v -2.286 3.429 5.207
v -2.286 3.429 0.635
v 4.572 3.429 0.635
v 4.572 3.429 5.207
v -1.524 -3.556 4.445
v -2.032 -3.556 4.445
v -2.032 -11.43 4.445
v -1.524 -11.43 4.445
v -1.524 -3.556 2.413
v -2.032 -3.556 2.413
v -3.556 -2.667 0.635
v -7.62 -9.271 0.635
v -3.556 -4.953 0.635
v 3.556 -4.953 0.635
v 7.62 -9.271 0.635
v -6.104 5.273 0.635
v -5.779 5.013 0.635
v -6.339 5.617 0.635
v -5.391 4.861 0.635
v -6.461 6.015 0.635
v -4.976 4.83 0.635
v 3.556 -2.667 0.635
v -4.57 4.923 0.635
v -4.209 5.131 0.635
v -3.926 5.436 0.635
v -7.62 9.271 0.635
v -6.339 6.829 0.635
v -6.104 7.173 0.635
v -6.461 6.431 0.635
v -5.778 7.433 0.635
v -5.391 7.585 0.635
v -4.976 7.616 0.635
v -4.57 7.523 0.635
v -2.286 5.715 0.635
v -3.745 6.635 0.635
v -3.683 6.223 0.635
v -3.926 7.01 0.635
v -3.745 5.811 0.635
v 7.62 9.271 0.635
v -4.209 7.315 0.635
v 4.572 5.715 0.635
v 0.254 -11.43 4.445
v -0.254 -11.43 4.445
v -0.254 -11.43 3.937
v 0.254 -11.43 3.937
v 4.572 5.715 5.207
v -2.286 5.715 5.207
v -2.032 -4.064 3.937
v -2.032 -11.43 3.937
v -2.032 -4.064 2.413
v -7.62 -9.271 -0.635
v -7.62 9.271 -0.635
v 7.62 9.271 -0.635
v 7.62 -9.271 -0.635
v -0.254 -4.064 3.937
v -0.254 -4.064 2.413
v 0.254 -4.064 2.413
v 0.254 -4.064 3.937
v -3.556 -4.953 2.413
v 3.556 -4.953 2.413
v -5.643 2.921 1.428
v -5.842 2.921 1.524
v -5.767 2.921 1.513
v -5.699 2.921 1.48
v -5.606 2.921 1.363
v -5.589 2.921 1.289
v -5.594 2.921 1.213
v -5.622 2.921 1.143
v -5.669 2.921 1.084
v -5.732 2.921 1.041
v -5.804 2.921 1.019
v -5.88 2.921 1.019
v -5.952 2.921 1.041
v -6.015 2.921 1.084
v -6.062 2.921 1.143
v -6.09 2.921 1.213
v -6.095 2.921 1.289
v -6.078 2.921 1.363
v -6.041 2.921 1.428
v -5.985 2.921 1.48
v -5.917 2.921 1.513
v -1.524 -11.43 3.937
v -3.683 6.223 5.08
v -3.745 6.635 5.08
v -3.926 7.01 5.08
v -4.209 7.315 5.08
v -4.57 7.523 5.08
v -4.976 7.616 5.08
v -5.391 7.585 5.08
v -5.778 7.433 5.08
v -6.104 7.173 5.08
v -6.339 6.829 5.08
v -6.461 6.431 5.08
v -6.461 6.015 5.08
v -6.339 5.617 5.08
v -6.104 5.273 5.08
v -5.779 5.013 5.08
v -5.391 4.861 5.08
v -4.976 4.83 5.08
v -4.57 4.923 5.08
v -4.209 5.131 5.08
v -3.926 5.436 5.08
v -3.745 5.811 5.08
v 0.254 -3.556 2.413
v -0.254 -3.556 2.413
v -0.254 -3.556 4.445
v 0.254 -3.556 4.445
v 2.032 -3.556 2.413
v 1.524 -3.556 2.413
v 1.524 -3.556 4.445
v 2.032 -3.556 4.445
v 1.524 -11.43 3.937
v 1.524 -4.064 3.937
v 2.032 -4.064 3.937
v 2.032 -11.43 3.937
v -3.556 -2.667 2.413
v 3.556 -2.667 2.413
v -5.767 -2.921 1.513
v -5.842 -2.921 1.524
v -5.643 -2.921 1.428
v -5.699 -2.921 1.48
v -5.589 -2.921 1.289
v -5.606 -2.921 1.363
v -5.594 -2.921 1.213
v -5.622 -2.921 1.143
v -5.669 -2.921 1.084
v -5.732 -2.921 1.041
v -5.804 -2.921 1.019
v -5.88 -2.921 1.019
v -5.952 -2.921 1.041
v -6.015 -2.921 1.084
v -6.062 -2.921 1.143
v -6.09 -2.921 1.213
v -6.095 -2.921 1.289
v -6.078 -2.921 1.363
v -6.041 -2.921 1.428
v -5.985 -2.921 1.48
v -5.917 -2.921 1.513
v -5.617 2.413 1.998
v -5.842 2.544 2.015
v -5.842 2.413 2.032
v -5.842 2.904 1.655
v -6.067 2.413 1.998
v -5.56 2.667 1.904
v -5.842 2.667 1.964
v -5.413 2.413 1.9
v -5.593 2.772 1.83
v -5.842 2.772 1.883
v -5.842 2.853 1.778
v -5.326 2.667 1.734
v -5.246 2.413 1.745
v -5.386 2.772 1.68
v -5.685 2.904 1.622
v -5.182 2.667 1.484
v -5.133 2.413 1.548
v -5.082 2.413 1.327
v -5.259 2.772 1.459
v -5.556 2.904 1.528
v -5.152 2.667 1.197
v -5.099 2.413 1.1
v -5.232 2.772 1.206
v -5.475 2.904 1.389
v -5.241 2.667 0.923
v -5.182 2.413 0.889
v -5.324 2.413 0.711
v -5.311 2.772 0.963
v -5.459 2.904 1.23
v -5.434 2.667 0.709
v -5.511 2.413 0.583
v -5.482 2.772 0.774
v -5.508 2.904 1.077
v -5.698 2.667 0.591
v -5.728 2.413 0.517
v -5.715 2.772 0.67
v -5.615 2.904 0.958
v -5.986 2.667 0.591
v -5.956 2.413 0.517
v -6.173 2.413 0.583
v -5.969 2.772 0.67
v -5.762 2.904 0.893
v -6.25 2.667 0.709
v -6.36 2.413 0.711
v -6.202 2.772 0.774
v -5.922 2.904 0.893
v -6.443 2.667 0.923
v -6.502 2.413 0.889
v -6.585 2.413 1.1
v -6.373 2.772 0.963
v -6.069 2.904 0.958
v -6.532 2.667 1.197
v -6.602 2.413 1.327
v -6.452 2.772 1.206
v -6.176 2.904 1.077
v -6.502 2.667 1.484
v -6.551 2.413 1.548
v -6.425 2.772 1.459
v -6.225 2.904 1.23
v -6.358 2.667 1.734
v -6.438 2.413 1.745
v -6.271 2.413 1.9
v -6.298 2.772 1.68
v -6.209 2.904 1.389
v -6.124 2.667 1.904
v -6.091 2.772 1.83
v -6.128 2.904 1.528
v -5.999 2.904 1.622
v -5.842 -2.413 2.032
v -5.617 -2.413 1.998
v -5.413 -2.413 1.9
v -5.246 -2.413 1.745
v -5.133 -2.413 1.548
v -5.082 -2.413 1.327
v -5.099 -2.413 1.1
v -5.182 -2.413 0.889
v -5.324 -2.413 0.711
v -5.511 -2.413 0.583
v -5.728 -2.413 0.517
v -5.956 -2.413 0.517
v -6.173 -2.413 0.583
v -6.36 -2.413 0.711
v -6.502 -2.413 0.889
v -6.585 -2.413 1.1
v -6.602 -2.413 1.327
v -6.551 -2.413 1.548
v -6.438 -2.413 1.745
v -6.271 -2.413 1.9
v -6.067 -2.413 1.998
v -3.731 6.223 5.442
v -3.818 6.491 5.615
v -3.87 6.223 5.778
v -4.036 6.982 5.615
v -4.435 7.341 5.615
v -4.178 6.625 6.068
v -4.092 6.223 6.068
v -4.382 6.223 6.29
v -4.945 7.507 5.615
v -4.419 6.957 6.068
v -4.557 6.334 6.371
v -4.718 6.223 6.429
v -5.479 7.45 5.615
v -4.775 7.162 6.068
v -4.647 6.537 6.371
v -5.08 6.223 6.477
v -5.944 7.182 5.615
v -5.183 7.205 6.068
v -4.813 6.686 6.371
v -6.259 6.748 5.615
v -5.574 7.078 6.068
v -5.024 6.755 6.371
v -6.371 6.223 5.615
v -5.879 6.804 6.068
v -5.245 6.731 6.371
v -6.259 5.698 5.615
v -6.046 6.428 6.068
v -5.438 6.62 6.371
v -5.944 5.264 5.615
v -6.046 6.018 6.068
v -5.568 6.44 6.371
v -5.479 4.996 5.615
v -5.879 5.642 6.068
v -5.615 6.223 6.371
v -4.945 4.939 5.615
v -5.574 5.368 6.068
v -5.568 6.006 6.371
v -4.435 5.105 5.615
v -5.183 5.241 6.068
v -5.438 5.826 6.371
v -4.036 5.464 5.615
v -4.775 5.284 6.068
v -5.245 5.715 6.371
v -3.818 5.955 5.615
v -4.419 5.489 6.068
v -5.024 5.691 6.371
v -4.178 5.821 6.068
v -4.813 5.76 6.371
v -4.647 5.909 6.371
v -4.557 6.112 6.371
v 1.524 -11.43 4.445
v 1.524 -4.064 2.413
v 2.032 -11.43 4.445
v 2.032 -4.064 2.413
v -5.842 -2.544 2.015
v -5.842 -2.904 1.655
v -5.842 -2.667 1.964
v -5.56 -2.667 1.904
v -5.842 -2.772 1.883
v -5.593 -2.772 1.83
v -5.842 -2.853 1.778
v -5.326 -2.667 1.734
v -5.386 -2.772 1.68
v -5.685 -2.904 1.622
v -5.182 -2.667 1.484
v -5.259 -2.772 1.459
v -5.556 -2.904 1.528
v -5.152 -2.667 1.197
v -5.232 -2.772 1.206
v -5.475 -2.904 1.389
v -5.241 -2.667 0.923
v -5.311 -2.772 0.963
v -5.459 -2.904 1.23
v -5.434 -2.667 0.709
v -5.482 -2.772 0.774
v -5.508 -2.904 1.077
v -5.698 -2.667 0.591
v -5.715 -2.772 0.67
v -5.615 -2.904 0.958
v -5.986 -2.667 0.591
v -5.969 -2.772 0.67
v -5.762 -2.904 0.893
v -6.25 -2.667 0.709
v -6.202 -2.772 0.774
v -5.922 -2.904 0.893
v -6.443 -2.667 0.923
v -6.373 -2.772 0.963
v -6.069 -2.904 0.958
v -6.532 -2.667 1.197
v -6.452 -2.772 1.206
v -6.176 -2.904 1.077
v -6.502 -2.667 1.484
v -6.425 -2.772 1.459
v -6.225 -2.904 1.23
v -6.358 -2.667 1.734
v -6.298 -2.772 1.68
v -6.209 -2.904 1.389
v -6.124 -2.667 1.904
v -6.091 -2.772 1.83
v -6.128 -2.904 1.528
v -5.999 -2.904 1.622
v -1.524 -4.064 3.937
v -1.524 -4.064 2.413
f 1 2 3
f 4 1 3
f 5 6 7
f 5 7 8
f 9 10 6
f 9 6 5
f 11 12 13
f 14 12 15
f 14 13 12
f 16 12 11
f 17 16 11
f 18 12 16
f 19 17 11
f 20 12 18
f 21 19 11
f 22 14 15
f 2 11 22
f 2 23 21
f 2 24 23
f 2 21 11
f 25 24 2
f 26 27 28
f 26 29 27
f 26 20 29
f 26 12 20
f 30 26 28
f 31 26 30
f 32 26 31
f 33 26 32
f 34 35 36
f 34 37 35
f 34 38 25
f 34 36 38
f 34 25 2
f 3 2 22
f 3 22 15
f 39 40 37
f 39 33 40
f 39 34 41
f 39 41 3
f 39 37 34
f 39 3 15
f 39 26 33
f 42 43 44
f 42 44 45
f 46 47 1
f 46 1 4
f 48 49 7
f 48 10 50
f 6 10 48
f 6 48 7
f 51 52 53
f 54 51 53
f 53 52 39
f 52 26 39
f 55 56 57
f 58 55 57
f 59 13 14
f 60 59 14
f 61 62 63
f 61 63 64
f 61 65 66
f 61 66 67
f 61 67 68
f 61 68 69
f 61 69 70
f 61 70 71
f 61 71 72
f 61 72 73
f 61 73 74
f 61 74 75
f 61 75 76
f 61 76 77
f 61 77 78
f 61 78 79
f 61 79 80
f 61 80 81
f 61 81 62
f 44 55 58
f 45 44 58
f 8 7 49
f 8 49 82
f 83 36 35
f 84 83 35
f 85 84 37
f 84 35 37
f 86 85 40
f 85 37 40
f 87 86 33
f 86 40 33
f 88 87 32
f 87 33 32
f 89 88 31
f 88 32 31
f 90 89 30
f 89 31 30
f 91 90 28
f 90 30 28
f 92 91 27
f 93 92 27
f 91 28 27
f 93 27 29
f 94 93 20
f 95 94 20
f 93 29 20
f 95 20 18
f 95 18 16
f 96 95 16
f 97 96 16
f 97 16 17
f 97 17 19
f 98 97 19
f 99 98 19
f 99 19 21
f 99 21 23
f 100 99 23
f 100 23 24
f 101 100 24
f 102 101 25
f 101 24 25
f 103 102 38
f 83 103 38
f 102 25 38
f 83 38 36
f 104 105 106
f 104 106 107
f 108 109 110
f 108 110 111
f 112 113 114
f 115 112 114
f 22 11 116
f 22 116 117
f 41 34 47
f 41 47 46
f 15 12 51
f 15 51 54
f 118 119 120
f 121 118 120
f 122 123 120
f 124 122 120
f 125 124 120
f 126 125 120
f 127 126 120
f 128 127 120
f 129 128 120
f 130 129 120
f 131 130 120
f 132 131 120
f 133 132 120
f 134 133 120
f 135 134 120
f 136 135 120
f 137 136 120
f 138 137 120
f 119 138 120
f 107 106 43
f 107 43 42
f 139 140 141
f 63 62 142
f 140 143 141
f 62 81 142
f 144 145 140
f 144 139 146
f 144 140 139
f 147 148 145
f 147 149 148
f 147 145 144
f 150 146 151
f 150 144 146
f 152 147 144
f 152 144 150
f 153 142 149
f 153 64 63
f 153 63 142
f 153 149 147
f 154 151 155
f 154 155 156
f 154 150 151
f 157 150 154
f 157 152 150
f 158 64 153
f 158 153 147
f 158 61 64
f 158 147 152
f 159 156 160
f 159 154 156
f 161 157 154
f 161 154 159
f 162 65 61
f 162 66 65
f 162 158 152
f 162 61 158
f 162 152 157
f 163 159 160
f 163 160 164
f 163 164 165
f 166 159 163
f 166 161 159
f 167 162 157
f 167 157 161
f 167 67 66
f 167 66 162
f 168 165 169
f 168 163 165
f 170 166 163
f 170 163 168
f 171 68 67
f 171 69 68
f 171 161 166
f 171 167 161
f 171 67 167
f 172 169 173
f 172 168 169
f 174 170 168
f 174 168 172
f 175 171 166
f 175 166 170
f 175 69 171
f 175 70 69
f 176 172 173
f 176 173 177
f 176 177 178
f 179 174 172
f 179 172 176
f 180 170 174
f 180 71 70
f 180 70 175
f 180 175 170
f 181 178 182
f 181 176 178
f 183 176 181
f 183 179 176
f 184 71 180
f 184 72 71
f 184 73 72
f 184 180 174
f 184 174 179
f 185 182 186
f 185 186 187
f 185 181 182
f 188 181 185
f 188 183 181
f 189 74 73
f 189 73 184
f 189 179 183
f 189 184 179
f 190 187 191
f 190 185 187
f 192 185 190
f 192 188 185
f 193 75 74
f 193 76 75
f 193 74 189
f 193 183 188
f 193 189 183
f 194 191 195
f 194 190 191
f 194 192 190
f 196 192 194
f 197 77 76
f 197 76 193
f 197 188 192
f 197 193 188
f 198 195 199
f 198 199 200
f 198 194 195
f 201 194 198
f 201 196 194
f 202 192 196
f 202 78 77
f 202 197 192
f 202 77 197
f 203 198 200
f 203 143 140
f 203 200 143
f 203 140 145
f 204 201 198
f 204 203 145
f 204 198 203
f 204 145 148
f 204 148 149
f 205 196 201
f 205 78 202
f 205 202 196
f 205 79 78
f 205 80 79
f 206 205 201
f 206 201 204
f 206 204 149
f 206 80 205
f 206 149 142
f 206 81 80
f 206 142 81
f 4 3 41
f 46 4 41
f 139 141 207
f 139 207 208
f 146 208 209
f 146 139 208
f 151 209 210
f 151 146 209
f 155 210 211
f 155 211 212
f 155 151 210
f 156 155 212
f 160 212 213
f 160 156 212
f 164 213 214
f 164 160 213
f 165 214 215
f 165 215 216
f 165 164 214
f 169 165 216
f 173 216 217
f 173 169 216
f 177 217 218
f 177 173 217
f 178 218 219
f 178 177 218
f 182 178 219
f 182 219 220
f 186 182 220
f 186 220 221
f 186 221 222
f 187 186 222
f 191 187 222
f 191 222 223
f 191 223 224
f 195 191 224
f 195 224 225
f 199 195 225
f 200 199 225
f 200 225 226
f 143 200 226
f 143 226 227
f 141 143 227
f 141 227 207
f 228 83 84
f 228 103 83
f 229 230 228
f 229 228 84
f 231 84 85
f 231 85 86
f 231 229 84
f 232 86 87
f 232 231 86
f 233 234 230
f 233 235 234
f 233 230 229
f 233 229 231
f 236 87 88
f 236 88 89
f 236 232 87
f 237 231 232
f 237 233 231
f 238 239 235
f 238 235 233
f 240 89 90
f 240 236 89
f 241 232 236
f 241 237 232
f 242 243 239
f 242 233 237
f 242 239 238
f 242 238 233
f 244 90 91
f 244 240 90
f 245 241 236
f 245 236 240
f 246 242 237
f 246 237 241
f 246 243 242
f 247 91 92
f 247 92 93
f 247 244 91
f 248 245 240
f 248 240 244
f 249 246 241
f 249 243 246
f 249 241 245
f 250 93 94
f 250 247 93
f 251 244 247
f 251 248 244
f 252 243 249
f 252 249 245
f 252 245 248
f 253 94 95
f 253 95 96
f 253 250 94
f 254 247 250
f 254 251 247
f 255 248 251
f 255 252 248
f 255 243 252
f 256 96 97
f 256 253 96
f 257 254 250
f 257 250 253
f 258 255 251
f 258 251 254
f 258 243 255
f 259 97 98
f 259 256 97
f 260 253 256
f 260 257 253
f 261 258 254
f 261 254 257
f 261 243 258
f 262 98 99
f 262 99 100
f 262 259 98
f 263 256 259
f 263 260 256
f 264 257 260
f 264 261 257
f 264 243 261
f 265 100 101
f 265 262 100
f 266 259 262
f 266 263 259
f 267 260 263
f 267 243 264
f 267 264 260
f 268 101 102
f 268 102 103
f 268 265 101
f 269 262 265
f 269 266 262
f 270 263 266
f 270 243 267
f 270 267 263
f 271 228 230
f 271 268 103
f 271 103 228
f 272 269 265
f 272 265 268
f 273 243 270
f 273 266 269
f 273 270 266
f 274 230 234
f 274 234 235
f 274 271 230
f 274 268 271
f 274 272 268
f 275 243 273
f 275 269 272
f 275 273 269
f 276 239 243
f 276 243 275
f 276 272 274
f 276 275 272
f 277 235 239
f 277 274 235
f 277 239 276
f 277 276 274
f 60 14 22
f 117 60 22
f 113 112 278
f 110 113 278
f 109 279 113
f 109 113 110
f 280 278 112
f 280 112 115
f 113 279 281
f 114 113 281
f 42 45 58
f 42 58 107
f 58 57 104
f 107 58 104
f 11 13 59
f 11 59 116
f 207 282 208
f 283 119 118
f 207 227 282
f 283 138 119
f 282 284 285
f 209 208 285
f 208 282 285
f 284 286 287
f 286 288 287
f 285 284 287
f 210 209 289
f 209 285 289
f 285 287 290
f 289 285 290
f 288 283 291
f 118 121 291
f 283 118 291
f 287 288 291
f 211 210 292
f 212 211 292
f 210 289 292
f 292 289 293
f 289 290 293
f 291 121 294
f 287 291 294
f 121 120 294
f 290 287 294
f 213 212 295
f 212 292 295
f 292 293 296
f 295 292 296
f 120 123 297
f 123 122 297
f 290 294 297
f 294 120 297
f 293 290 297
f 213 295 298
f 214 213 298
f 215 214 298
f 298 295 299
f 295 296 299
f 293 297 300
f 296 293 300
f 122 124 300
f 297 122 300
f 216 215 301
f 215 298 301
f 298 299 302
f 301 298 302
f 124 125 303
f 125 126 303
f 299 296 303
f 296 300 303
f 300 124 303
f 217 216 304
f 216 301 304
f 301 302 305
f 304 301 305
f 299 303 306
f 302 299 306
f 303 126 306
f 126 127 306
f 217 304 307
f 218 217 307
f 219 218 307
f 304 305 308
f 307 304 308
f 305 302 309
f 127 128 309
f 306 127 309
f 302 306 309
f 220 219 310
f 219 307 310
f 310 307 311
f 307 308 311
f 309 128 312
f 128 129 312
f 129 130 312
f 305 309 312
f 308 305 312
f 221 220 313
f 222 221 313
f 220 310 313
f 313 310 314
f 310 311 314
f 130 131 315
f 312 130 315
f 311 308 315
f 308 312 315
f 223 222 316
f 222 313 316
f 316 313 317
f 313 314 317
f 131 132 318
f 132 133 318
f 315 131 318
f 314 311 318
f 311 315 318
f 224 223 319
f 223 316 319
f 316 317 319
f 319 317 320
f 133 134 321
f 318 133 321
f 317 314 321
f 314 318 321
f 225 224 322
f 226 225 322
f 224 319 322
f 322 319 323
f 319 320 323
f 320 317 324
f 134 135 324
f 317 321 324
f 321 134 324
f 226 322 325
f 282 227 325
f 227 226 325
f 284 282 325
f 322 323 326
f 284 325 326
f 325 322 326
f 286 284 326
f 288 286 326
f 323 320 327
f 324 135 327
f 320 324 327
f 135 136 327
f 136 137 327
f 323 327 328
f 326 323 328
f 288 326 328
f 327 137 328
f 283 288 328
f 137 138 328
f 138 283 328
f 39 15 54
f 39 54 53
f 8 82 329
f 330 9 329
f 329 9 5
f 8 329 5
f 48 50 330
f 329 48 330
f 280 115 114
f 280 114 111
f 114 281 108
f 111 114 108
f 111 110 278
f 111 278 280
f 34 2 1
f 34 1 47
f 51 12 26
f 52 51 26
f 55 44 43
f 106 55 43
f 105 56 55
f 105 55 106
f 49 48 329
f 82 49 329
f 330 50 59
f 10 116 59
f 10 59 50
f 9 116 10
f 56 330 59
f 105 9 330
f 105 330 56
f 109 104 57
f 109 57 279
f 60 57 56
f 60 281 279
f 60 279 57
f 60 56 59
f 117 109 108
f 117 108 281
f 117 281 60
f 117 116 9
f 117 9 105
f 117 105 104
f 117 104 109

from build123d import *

# Parameters (mm, degrees)
SKETCH1_W           = 15.24
SKETCH1_H           = 18.542
BOSS_EXTRUDE1_DEPTH = 0.635
SKETCH2_W           = 7.112
SKETCH2_H           = 2.286
BOSS_EXTRUDE2_DEPTH = 1.778
SKETCH3_W           = 0.508
SKETCH3_H           = 0.508
BOSS_EXTRUDE3_DEPTH = 2.032
SKETCH4_W           = 0.508
SKETCH4_H           = 0.508
BOSS_EXTRUDE4_DEPTH = 7.366
SKETCH8_W           = 6.858
SKETCH8_H           = 2.286
BOSS_EXTRUDE6_DEPTH = 4.572
SKETCH9_R           = 1.397
BOSS_EXTRUDE7_DEPTH = 5.842
FILLET1_R           = 1.397
SKETCH10_R          = 0.762
BOSS_EXTRUDE8_DEPTH = 2.921
FILLET2_R           = 0.508


with BuildPart() as part:
    # Sketch1 → Boss-Extrude1 (new, symmetric)
    with BuildSketch(Plane.XY):
        Rectangle(SKETCH1_W, SKETCH1_H)
    extrude(amount=BOSS_EXTRUDE1_DEPTH, both=True)

    # Sketch2 → Boss-Extrude2 (add)
    with BuildSketch(Plane.XY.offset(0.635)):
        with Locations((0, -3.81)):
            Rectangle(SKETCH2_W, SKETCH2_H)
    extrude(amount=BOSS_EXTRUDE2_DEPTH)

    # Sketch3 → Boss-Extrude3 (add)
    with BuildSketch(Plane.XY.offset(2.413)):
        with Locations((-1.778, -3.81)):
            Rectangle(SKETCH3_W, SKETCH3_H)
        with Locations((0, -3.81)):
            Rectangle(SKETCH3_W, SKETCH3_H)
        with Locations((1.778, -3.81)):
            Rectangle(SKETCH3_W, SKETCH3_H)
    extrude(amount=BOSS_EXTRUDE3_DEPTH)

    # Sketch4 → Boss-Extrude4 (add)
    with BuildSketch(Plane.XZ.offset(4.064)):
        with Locations((-1.778, 4.191)):
            Rectangle(SKETCH4_W, SKETCH4_H)
        with Locations((0, 4.191)):
            Rectangle(SKETCH4_W, SKETCH4_H)
        with Locations((1.778, 4.191)):
            Rectangle(SKETCH4_W, SKETCH4_H)
    extrude(amount=BOSS_EXTRUDE4_DEPTH)

    # Sketch8 → Boss-Extrude6 (add)
    with BuildSketch(Plane.XY.offset(0.635)):
        with Locations((1.143, 4.572)):
            Rectangle(SKETCH8_W, SKETCH8_H)
    extrude(amount=BOSS_EXTRUDE6_DEPTH)

    # Sketch9 → Boss-Extrude7 (add)
    with BuildSketch(Plane.XY.offset(0.635)):
        with Locations((-5.08, 6.223)):
            Circle(SKETCH9_R)
    extrude(amount=BOSS_EXTRUDE7_DEPTH)

    # Fillet1
    fillet1_edges = [part.edges().sort_by_distance(p)[0] for p in [
        (-6.477, 6.223, 6.477),
    ]]
    fillet(fillet1_edges, radius=FILLET1_R)


with BuildPart() as body_2:
    # Sketch10 → Boss-Extrude8 (new, symmetric)
    with BuildSketch(Plane(origin=(0, 0, 0), x_dir=(1, 0, 0), z_dir=(0, 1, 0))):
        with Locations(Location((-5.842, -1.27, 0), (0, 0, 270))):
            Circle(SKETCH10_R)
    extrude(amount=BOSS_EXTRUDE8_DEPTH, both=True)

    # Fillet2
    fillet2_edges = [body_2.edges().sort_by_distance(p)[0] for p in [
        (-5.842, -2.921, 0.508),
        (-5.842, 2.921, 0.508),
    ]]
    fillet(fillet2_edges, radius=FILLET2_R)


solid = Compound([part.part, body_2.part])
